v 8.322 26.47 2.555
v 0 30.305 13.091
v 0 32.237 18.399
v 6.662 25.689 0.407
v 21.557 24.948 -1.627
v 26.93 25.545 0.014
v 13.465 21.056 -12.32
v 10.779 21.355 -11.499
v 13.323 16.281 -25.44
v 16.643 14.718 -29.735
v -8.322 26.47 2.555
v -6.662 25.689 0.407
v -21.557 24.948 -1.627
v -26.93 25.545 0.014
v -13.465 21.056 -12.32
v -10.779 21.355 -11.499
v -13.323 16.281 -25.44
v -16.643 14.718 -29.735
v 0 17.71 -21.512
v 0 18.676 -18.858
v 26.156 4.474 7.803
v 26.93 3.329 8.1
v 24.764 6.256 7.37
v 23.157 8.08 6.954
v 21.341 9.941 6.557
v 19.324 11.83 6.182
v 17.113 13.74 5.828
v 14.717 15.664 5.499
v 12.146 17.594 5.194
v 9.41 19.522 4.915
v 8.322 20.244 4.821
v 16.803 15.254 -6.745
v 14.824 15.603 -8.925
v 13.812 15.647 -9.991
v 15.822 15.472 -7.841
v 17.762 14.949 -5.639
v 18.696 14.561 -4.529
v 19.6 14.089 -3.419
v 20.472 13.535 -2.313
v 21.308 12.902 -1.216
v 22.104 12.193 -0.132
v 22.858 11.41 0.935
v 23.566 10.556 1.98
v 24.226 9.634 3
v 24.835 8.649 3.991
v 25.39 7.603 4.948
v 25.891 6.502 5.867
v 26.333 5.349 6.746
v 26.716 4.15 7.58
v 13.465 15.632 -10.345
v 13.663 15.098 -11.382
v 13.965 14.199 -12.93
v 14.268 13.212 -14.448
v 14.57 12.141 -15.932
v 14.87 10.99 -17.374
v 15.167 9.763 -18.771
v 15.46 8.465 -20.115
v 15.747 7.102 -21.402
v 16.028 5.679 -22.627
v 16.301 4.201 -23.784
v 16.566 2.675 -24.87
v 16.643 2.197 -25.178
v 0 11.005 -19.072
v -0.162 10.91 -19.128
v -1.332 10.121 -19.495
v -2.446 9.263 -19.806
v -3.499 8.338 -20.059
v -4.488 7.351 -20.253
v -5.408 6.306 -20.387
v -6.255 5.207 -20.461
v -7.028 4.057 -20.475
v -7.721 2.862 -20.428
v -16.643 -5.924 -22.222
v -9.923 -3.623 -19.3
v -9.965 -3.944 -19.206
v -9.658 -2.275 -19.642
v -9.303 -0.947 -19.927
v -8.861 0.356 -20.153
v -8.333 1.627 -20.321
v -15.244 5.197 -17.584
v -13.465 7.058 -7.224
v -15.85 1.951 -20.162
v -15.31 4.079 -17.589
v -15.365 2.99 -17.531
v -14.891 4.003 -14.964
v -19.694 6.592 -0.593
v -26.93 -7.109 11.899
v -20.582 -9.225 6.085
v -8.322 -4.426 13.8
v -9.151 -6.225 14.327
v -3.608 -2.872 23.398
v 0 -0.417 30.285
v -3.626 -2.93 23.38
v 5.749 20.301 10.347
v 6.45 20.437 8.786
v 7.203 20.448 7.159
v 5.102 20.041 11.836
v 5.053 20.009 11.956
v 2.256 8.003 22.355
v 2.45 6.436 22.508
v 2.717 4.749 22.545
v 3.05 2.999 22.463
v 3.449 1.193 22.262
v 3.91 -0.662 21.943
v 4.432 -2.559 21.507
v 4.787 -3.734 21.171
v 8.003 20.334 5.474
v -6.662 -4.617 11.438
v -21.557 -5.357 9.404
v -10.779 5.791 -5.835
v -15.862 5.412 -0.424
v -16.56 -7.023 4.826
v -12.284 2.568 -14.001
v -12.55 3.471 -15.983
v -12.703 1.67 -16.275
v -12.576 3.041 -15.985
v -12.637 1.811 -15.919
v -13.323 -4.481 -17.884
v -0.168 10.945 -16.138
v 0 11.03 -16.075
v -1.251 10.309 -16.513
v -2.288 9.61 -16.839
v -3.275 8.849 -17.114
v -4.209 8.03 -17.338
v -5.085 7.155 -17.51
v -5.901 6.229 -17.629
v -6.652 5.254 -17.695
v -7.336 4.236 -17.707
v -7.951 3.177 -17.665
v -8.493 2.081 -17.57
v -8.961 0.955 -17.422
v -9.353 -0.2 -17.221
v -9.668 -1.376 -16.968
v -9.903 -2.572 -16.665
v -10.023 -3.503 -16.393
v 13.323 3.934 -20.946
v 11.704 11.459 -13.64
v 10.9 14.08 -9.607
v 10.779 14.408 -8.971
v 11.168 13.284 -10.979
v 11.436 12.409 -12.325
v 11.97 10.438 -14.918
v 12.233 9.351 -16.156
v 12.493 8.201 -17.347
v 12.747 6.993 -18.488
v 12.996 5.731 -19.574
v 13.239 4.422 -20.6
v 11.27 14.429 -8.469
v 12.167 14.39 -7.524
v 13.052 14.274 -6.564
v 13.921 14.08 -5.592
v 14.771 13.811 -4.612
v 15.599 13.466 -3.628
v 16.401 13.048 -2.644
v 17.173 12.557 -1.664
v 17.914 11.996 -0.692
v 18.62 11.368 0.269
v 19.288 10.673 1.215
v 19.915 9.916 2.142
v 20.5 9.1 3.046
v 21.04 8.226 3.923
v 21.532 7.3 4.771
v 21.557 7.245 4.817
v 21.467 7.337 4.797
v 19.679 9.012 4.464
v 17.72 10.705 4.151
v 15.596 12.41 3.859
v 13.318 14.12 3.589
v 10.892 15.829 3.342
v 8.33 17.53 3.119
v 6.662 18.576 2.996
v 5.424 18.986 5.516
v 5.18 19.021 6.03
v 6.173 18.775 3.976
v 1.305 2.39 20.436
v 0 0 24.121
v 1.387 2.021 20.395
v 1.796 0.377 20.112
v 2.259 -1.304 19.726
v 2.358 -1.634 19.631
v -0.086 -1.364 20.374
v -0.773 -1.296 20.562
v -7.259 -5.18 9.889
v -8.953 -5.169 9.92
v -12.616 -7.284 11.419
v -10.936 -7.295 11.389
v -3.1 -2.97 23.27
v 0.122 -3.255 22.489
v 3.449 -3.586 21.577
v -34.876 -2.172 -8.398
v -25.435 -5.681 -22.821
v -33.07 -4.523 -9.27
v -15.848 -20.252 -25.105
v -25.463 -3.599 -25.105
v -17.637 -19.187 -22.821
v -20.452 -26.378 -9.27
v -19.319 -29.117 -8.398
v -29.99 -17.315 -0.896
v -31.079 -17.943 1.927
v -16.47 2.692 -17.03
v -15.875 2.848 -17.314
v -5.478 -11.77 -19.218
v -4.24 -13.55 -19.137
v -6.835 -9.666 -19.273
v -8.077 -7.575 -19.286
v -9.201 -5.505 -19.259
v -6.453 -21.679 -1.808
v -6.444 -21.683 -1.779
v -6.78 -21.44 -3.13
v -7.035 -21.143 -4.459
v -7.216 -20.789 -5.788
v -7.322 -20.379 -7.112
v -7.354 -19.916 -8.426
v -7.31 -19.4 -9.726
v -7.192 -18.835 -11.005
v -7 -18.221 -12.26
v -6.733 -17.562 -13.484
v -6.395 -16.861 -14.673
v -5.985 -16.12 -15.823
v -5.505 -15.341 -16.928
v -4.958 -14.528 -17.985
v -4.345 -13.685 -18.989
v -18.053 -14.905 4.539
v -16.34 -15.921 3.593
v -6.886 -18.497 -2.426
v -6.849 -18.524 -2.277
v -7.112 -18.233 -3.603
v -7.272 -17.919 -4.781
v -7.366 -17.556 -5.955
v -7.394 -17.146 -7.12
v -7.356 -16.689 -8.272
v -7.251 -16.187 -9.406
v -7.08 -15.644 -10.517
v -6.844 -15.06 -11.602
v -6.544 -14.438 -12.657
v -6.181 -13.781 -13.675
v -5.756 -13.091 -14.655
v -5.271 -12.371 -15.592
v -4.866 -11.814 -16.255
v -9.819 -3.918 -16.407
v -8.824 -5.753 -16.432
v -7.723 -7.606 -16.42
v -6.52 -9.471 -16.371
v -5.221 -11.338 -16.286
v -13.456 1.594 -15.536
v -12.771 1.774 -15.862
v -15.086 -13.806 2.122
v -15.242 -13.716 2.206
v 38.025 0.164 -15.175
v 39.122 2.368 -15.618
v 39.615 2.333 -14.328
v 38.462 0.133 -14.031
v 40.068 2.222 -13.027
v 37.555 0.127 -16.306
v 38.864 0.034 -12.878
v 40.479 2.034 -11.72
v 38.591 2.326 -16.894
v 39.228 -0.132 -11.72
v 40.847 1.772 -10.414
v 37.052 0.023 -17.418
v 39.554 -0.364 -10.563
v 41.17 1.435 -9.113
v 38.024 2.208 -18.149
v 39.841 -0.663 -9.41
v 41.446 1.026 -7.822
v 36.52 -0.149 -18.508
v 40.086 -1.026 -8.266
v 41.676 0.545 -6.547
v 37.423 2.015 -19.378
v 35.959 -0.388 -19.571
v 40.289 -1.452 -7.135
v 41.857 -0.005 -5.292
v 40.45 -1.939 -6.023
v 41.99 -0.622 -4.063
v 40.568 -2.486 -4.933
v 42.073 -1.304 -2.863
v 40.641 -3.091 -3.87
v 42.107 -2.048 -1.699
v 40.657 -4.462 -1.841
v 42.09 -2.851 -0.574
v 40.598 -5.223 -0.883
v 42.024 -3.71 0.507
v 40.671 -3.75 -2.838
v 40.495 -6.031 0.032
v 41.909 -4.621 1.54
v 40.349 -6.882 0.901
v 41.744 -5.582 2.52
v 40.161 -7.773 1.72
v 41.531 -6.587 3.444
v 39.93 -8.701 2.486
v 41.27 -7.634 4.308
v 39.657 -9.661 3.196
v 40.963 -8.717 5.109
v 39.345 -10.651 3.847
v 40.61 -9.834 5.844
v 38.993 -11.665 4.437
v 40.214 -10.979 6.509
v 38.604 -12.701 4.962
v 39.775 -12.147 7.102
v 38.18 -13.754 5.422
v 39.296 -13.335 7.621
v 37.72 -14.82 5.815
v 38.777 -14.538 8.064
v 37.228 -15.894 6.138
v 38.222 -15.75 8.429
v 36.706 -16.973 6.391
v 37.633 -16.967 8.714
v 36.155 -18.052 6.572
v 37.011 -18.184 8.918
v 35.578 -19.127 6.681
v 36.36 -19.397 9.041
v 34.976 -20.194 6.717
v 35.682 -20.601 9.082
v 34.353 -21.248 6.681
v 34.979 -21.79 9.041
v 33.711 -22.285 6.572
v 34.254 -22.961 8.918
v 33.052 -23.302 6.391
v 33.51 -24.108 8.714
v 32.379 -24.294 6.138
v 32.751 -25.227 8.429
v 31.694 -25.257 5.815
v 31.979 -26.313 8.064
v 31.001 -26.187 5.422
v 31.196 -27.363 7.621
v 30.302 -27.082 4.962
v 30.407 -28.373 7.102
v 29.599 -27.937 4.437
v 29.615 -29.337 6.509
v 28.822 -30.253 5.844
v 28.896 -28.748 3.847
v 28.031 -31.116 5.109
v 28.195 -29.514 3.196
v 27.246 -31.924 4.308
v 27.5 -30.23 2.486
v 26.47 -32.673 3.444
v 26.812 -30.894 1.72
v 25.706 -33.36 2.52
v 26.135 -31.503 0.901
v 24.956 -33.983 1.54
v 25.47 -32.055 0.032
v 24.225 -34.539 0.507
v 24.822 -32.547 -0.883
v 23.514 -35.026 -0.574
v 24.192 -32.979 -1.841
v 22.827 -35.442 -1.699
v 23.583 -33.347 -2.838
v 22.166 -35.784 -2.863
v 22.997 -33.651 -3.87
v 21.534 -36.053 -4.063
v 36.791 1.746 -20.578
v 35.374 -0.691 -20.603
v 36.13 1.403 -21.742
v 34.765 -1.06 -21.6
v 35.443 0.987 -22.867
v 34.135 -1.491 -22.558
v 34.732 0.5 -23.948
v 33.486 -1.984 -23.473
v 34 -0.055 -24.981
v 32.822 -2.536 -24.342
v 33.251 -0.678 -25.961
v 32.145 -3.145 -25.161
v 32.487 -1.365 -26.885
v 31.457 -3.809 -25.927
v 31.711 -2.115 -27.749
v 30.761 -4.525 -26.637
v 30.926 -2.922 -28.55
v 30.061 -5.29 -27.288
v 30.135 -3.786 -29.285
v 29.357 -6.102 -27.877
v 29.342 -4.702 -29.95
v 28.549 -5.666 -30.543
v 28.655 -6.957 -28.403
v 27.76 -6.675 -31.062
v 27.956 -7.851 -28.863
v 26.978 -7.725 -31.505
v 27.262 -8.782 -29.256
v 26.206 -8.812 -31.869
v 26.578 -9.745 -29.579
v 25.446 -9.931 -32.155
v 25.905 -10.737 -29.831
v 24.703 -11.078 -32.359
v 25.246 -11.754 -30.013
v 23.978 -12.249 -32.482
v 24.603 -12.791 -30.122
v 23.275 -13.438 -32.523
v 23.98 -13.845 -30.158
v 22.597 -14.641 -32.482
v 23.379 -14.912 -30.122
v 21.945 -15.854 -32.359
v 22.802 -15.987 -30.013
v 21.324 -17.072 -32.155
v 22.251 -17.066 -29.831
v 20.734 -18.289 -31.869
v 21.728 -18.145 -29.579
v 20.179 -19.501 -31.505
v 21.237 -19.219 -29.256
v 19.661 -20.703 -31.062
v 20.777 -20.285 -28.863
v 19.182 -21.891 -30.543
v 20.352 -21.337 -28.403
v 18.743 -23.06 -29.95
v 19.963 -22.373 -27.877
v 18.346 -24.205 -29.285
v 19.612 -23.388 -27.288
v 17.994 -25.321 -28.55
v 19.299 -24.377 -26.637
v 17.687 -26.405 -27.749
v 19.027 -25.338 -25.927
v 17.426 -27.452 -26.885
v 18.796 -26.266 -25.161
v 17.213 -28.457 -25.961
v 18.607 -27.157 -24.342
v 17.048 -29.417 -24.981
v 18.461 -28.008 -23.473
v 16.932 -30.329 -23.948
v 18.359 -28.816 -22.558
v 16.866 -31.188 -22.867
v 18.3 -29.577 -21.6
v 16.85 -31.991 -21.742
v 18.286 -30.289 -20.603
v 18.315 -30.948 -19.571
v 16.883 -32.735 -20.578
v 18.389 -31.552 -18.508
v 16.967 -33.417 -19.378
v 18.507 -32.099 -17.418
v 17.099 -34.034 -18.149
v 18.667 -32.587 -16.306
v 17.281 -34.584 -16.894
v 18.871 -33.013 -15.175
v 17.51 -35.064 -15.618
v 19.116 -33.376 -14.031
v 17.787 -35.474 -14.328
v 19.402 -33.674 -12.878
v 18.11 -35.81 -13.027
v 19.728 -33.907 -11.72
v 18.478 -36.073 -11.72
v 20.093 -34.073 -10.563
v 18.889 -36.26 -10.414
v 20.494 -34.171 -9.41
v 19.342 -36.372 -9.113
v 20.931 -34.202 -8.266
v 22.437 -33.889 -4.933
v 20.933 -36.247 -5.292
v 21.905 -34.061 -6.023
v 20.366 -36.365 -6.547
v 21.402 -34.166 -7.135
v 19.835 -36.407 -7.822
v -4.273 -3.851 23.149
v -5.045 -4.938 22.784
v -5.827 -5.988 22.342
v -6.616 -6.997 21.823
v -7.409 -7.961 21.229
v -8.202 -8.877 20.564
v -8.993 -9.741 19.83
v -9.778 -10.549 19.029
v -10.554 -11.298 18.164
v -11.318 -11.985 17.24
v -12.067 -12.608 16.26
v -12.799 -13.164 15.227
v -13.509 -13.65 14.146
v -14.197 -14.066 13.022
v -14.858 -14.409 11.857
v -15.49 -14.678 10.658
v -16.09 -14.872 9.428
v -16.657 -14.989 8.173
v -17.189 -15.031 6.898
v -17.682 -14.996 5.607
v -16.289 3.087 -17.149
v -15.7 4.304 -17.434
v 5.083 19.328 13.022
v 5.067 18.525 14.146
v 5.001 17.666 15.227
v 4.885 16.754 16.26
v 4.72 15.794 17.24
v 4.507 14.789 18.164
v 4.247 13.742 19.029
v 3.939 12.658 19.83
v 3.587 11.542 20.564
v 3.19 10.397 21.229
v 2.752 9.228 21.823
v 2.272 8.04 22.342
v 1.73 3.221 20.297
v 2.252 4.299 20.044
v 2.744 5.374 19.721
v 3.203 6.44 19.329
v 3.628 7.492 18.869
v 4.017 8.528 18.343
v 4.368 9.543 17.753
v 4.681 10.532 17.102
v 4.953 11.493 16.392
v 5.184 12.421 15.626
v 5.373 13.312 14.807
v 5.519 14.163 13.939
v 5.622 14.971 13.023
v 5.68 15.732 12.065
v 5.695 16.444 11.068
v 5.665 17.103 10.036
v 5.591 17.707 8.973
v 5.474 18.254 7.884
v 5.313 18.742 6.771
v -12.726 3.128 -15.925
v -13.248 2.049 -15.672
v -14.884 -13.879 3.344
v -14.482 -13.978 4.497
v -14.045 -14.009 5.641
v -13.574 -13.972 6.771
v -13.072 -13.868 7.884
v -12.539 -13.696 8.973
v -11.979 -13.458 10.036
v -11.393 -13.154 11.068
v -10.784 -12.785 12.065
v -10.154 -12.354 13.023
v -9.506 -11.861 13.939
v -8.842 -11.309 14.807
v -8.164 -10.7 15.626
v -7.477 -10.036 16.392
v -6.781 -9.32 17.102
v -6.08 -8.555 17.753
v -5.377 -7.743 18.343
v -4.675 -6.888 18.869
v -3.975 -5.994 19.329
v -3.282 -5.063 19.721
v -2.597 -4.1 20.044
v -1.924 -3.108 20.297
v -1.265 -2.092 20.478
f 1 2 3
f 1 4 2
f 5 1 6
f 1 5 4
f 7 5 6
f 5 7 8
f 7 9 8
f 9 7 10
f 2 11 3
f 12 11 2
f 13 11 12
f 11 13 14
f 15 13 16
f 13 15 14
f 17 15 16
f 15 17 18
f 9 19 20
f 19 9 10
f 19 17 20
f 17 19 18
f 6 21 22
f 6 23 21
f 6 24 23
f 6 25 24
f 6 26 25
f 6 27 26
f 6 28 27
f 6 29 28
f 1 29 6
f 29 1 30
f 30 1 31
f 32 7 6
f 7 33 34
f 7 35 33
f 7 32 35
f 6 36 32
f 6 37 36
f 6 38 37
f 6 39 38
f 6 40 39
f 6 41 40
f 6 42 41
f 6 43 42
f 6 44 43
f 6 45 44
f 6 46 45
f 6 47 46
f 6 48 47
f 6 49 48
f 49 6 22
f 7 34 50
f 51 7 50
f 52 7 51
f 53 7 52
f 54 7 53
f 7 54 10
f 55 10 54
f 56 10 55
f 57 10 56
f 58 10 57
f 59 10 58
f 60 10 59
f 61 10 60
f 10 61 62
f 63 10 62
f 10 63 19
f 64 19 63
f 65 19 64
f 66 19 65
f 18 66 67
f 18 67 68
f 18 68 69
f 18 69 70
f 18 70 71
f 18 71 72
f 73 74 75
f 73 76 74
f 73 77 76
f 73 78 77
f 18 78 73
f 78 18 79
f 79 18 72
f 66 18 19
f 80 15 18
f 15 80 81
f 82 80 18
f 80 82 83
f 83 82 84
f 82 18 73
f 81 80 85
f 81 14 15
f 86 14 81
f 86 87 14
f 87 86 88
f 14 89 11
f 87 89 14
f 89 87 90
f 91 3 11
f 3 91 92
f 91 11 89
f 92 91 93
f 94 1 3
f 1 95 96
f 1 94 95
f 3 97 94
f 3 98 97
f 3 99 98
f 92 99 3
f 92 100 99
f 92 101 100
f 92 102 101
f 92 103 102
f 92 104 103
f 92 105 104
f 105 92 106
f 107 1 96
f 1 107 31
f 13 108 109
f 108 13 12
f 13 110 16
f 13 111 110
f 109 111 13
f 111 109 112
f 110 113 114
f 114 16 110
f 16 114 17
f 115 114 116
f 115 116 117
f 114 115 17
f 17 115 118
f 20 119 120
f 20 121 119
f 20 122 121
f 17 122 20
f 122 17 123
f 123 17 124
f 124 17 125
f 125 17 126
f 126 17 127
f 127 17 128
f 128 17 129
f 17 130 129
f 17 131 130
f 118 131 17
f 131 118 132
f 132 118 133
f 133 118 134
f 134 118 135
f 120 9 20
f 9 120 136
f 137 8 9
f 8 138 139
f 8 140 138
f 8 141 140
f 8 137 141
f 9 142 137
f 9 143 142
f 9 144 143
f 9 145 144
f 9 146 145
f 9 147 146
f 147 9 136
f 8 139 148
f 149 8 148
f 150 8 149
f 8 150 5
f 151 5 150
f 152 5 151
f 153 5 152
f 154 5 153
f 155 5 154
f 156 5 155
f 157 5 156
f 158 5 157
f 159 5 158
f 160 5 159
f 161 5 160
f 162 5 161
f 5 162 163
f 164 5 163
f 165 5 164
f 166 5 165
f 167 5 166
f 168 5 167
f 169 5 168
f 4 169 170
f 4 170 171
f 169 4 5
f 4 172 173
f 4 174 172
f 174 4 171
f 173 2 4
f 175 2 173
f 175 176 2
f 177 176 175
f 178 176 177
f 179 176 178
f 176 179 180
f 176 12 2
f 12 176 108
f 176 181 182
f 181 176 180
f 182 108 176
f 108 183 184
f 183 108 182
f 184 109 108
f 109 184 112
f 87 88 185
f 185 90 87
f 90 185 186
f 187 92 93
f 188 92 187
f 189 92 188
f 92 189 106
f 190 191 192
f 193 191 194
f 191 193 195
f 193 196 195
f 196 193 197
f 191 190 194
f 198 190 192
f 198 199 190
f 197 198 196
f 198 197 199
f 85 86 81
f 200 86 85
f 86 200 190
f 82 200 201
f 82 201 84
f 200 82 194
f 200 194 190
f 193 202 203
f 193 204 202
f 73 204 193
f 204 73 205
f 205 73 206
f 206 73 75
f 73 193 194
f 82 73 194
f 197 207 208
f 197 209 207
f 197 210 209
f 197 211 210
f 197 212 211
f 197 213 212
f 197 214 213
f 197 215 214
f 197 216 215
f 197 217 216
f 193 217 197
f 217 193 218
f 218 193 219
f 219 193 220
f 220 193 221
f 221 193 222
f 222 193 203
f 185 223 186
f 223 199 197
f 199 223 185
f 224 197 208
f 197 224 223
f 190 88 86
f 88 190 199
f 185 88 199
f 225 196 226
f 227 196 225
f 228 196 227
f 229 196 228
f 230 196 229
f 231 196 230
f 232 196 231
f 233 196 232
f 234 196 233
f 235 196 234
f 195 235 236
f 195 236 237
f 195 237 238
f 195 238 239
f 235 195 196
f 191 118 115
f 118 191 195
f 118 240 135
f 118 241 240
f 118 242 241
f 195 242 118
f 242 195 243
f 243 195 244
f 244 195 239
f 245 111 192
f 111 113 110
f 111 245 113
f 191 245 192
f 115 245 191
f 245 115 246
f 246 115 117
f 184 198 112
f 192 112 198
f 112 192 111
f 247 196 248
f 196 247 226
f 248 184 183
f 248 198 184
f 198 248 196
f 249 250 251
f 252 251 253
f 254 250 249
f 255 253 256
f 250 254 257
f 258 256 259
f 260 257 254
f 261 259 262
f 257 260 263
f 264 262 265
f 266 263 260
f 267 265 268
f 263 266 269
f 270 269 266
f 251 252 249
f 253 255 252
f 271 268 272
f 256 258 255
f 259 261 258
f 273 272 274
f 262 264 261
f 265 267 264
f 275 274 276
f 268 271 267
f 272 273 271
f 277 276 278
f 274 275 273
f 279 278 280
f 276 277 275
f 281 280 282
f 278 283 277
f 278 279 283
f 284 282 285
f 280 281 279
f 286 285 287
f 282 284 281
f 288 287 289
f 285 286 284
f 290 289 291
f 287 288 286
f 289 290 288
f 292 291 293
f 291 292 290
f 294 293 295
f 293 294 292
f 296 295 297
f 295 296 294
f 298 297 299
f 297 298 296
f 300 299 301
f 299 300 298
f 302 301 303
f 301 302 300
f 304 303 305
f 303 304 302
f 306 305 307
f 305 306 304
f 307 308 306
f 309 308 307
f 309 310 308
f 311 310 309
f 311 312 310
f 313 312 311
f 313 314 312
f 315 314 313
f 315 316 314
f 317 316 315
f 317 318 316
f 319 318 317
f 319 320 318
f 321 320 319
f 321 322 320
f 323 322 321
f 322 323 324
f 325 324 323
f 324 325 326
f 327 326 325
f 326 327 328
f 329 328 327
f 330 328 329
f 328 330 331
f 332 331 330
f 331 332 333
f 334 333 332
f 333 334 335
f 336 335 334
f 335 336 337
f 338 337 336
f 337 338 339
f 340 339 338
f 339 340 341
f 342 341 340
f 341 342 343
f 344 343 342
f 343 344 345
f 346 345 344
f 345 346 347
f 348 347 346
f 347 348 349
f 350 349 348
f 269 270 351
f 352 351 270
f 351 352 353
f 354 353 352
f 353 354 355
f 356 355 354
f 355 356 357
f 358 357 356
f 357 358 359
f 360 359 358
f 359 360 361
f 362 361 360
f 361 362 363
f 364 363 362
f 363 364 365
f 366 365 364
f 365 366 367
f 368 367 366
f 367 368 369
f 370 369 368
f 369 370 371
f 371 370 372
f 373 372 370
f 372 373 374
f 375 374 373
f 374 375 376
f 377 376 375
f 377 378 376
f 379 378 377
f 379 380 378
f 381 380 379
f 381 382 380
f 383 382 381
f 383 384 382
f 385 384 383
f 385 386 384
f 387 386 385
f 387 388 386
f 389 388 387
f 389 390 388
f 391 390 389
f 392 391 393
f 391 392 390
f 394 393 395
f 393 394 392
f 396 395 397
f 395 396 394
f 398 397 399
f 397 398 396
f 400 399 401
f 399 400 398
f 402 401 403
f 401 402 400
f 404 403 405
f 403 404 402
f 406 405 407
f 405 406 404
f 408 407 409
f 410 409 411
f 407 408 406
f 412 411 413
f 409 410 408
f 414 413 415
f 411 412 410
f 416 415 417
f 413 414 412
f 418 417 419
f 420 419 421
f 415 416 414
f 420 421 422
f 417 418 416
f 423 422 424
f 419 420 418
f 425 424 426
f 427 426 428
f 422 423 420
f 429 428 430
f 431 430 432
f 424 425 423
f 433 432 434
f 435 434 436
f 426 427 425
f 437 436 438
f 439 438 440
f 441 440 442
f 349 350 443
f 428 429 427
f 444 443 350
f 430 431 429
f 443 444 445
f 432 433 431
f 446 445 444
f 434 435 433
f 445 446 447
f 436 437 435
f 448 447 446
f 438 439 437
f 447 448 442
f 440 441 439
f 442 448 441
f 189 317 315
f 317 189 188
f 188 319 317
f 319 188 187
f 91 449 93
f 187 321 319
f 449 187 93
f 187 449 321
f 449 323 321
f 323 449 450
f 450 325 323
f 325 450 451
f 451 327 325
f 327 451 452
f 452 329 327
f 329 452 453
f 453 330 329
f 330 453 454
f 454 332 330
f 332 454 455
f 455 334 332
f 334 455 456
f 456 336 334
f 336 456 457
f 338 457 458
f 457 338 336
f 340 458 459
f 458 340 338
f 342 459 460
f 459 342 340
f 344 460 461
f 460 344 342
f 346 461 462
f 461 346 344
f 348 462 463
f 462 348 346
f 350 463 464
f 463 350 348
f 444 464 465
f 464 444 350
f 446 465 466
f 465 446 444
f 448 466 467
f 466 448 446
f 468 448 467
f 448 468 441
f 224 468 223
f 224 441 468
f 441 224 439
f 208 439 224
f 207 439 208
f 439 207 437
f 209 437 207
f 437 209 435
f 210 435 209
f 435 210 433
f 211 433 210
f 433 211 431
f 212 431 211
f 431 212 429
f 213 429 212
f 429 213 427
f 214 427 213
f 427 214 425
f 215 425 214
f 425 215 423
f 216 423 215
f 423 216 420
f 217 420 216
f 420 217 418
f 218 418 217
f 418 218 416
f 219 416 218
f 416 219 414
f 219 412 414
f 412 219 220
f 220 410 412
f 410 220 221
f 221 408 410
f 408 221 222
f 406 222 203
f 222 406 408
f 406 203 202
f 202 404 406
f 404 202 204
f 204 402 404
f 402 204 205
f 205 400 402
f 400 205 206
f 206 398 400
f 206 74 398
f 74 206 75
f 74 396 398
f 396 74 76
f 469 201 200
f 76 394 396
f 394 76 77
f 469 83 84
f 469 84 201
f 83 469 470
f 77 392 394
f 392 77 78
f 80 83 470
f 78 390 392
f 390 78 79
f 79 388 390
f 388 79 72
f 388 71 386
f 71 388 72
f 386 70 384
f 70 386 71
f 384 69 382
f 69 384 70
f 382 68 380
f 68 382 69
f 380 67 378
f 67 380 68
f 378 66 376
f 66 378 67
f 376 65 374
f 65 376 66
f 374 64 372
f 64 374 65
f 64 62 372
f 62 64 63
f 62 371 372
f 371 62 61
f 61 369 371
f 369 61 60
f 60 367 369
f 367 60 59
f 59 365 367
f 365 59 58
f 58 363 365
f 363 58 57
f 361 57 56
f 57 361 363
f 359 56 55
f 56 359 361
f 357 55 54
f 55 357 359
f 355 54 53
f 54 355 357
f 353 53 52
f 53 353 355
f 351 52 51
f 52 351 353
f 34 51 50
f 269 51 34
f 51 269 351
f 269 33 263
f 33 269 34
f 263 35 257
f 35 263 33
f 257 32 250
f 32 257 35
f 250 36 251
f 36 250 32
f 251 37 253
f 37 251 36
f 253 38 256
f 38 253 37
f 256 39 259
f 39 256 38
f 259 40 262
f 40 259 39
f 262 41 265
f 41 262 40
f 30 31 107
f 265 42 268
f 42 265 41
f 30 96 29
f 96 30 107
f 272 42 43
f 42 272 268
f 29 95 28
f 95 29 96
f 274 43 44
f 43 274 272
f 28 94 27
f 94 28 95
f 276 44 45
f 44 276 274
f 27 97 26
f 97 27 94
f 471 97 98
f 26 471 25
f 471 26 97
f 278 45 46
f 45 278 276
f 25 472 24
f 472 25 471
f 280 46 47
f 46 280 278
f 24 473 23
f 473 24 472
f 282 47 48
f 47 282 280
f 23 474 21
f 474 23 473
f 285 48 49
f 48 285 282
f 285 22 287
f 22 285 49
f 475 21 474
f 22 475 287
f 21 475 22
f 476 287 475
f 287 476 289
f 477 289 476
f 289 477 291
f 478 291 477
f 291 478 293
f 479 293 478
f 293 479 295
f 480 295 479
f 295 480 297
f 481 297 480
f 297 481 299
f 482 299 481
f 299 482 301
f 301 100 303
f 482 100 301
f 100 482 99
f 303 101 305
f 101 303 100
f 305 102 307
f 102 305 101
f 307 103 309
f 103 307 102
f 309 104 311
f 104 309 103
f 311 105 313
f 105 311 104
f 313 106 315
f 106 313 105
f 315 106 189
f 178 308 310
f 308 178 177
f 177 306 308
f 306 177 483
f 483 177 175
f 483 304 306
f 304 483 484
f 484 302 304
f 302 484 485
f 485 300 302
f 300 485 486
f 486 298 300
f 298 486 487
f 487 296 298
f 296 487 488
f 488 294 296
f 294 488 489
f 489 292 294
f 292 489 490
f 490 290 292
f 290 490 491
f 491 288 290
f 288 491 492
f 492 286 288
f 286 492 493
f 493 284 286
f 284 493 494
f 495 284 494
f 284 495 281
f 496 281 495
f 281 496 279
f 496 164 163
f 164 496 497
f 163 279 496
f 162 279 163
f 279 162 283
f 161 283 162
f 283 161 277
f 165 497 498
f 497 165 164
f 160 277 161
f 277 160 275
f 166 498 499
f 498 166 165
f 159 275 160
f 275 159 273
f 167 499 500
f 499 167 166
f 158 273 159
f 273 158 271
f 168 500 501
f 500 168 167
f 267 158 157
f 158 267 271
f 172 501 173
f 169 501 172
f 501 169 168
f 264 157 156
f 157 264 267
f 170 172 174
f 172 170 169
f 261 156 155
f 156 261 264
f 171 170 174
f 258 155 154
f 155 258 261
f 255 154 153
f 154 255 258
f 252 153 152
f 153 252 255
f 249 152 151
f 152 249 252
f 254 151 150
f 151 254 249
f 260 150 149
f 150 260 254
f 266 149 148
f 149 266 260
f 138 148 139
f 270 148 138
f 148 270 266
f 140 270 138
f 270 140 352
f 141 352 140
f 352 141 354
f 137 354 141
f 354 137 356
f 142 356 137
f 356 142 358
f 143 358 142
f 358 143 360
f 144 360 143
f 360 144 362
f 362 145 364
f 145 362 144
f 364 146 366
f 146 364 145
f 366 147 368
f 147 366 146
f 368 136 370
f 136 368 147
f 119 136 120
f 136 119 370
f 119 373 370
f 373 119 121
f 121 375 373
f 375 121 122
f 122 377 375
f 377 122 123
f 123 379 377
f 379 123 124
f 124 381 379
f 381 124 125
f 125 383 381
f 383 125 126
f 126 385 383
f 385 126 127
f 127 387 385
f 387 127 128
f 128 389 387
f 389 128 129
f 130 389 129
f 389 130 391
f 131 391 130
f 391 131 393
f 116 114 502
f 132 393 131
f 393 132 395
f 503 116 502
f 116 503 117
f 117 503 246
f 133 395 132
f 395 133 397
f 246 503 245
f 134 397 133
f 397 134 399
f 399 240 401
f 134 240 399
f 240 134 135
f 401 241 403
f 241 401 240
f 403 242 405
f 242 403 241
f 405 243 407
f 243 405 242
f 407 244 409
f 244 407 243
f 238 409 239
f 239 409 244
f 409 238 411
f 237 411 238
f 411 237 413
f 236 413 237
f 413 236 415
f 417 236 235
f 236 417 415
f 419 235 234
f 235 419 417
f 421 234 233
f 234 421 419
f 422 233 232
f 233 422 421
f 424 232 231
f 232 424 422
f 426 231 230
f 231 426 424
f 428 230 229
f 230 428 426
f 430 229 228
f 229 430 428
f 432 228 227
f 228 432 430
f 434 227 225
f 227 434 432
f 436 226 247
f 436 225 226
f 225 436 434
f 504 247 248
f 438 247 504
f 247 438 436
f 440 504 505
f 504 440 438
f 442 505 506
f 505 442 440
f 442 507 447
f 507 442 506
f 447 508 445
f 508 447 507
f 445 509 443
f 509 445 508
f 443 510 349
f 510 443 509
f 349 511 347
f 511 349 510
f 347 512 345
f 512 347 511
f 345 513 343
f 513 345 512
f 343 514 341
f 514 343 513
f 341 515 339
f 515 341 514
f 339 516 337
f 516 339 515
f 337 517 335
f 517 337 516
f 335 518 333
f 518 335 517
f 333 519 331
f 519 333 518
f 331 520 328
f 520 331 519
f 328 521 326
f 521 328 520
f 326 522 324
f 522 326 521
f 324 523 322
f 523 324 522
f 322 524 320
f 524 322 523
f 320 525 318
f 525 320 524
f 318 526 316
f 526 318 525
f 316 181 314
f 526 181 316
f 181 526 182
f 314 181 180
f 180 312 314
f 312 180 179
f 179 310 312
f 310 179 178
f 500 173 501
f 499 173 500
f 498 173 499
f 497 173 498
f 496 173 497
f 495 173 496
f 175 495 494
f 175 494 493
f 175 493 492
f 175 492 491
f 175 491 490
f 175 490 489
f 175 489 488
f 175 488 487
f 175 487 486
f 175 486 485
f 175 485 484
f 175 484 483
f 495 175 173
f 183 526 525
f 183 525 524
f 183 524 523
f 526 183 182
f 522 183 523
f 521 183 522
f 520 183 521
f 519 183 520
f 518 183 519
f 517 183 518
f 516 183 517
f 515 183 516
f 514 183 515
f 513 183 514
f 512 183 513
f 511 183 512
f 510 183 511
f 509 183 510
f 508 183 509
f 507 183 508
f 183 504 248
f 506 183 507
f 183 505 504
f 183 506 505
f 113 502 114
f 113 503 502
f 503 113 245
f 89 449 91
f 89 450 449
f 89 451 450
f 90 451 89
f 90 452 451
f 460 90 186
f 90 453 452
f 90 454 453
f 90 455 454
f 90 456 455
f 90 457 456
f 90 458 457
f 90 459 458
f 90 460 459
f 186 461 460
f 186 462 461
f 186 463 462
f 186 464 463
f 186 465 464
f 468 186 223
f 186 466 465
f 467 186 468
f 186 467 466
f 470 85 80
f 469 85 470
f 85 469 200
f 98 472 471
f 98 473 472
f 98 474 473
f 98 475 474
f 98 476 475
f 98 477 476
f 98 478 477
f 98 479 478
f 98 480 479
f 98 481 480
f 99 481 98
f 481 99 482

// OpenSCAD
// file: functions.scad
// Auxiliary functions

/**
 * Uses black magic to calculate side of square by given diagonal
 * @param  {[type]} diagonal) Square diagonal
 * @return {[type]}           Square side
 */
function diagonalToSide(diagonal) = sqrt(pow(diagonal,2)/2);

/**
 * 'Matematické tabulky pro střední školy' rulez
 * our 'diameter' = r + ϱ
 * ϱ = r * cos 180°/5 (could also be used for a generic n-gon but it's not
 *                     needed in this project, so we stick with 5 vertices)
 * => r = diameter / (1 + cos 36°)
 *
 * @param  {[type]} diameter) Pipe diameter
 * @return {[type]}           Outter radius of the pentagon
 */
function pentagonRadius(diameter) = diameter / (1 + cos(36));
// file: shapes.scad
use <functions.scad>

/**
 * Star shape
 * @param  {[type]} diameter Pipe diameter
 */
module star(diameter) {
    // length[0] - distance of vertice
    // length[1] - distance of intersecting edge
    length = [(2 * diameter) / 3, diameter / 3];

    // Generating points for polygn
    points = [
        for (angle = [0 : 36 : 360])
            [length[(angle/36) % 2] * cos(angle),
             length[(angle/36) % 2] * sin(angle)]
    ];

    // Render 2D star
    polygon(points);
}

/**
 * Ripped square shape
 * @param  {[type]} diameter Pipe diameter
 */
module rippedSquare(diameter) {
    side = diagonalToSide(diameter);

    // center the whole object
    translate([-side/2, -side/2])
        difference() {
            square(side);
            square(side/2);
        }
}

/**
 * Pentagon shape
 * @param  {[type]} diameter Pipe diameter
 */
module pentagon(diameter) {
    // Just a regular 'circle' with only 5 fragments
    // This could also be modified for a generic n-gon
    circle(r=pentagonRadius(diameter),$fn=5);
}
// file: splitter.scad
use <shapes.scad>
use <functions.scad>

/**
 * This module generates 2D profile of a given pipe
 * @param  {[type]}  shape      Pipe shape
 * @param  {[type]}  diameter   Pipe diameter
 * @param  {[type]}  wall_thick Wall thickness
 * @param  {Boolean} filling    Defines whether to fill the pipe or not
 */
module tubeProfile(shape, diameter, wall_thick, filling = false) {
    // To fill, or not to fill, that is the question!
    if(filling)
        offset(delta=wall_thick)
            object(shape, diameter);
    else
        difference() {
            offset(delta=wall_thick)
                object(shape, diameter);
            object(shape, diameter);
        }

    module object(shape, diameter) {
        rotate(-90) // Y axis is no facing to bottom side

        // Missing the switch statement :'(
        if (shape == "Star")
            star(diameter);

        else if (shape == "RippedSquare")
            rippedSquare(diameter);

        else if (shape == "Pentagon")
            pentagon(diameter);

        else if (shape == "Circle")
            circle(d=diameter);

        else if (shape == "Square")
            square(diagonalToSide(diameter), center=true);
    }
}

/**
 * Customized linear_extrude wrapper
 * @param  {[type}  shape    Pipe shape
 * @param  {[type]}  length   Pipe length
 * @param  {[type]}  diameter Pipe diameter
 * @param  {[type]}  angle    The angle between the pipe and the plane
 * @param  {Boolean} cover    Determines whether to generate regular pipe
 *                            or a top cover of the pipe
 */
module extrude(shape, length, diameter, angle, cover = false) {
    // extrude 2D tube profile to 3D pipe
    if(!cover || angle == 0)
        linear_extrude(height = length)
            children(0);

    // If the pipe is tilted stretch the pipe to Z axis
    if(angle != 0) {
        // calculate overlap depending on pipe shape and diameter
        overlap =
            (shape == "Star" ? (angle > 0 ? diameter / 3 : (2 * diameter) / 3) :
             shape == "Circle" ? diameter / 2 :
             shape == "Pentagon" ? (angle > 0 ? pentagonRadius(diameter) :
                pentagonRadius(diameter) * cos(36)) :
                diagonalToSide(diameter) / 2)
            * tan(abs(angle));

        // Gernerate a top cover of the pipe?
        if(cover) {
            translate([0,0,overlap])
                linear_extrude(height = length)
                    children(0);
        } else {
            rotate([0,180,0])
                linear_extrude(height = overlap)
                    children(0);
        }
    }
}

/**
 * Module that enables generating junctions for any number of pipes
 * @param  {Array}  pipes      Array with pipes definition
 * @param  {Number} wall_thick Wall thickness
 */
module splitter(pipes=[[]], wall_thick=2.5) {
    /*
     * Firstly I thought it would be easiest if I generate filled tubes and then
     * subtract the filling but it behaved very strangely. In the end I generate
     * tubes without filling and remove the filling once again.
     */
    difference() {
        // Iterate through all pipes (any amount) and render each one

        for (i = [0 : len(pipes)-1]) {
            pipe = pipes[i];
            rotate([pipe[3] - 90, 0, (360/len(pipes)) * i]) {
                // Render the pipe itself
                extrude(pipe[0], pipe[1], pipe[2], pipe[3])
                    tubeProfile(pipe[0], pipe[2], wall_thick);

                // Render a top cover of the pipe
                rotate([0,180,0])
                    extrude(pipe[0], wall_thick, pipe[2], pipe[3], true)
                        tubeProfile(pipe[0], pipe[2], wall_thick, true);
            }
        }

        // Remove center of the pipe. It's kinda duplicate but it's the best
        // solution that actually was working.
        for (i = [0 : len(pipes)-1]) {
            pipe = pipes[i];
            rotate([pipe[3] - 90, 0,(360/len(pipes)) * i])
                extrude(pipe[0], pipe[1], pipe[2], pipe[3])
                    tubeProfile(pipe[0], pipe[2], 0, true);
        }
    }
}
// main file
use <splitter.scad>

splitter([["Star", 24, 34, -20], ["Pentagon", 32, 24, -24], ["Circle", 36, 39, -19]], $fn=100);
//splitter([["Square", 38, 26, 25], ["Circle", 28, 40, -26], ["Star", 30, 27, -13]]);
